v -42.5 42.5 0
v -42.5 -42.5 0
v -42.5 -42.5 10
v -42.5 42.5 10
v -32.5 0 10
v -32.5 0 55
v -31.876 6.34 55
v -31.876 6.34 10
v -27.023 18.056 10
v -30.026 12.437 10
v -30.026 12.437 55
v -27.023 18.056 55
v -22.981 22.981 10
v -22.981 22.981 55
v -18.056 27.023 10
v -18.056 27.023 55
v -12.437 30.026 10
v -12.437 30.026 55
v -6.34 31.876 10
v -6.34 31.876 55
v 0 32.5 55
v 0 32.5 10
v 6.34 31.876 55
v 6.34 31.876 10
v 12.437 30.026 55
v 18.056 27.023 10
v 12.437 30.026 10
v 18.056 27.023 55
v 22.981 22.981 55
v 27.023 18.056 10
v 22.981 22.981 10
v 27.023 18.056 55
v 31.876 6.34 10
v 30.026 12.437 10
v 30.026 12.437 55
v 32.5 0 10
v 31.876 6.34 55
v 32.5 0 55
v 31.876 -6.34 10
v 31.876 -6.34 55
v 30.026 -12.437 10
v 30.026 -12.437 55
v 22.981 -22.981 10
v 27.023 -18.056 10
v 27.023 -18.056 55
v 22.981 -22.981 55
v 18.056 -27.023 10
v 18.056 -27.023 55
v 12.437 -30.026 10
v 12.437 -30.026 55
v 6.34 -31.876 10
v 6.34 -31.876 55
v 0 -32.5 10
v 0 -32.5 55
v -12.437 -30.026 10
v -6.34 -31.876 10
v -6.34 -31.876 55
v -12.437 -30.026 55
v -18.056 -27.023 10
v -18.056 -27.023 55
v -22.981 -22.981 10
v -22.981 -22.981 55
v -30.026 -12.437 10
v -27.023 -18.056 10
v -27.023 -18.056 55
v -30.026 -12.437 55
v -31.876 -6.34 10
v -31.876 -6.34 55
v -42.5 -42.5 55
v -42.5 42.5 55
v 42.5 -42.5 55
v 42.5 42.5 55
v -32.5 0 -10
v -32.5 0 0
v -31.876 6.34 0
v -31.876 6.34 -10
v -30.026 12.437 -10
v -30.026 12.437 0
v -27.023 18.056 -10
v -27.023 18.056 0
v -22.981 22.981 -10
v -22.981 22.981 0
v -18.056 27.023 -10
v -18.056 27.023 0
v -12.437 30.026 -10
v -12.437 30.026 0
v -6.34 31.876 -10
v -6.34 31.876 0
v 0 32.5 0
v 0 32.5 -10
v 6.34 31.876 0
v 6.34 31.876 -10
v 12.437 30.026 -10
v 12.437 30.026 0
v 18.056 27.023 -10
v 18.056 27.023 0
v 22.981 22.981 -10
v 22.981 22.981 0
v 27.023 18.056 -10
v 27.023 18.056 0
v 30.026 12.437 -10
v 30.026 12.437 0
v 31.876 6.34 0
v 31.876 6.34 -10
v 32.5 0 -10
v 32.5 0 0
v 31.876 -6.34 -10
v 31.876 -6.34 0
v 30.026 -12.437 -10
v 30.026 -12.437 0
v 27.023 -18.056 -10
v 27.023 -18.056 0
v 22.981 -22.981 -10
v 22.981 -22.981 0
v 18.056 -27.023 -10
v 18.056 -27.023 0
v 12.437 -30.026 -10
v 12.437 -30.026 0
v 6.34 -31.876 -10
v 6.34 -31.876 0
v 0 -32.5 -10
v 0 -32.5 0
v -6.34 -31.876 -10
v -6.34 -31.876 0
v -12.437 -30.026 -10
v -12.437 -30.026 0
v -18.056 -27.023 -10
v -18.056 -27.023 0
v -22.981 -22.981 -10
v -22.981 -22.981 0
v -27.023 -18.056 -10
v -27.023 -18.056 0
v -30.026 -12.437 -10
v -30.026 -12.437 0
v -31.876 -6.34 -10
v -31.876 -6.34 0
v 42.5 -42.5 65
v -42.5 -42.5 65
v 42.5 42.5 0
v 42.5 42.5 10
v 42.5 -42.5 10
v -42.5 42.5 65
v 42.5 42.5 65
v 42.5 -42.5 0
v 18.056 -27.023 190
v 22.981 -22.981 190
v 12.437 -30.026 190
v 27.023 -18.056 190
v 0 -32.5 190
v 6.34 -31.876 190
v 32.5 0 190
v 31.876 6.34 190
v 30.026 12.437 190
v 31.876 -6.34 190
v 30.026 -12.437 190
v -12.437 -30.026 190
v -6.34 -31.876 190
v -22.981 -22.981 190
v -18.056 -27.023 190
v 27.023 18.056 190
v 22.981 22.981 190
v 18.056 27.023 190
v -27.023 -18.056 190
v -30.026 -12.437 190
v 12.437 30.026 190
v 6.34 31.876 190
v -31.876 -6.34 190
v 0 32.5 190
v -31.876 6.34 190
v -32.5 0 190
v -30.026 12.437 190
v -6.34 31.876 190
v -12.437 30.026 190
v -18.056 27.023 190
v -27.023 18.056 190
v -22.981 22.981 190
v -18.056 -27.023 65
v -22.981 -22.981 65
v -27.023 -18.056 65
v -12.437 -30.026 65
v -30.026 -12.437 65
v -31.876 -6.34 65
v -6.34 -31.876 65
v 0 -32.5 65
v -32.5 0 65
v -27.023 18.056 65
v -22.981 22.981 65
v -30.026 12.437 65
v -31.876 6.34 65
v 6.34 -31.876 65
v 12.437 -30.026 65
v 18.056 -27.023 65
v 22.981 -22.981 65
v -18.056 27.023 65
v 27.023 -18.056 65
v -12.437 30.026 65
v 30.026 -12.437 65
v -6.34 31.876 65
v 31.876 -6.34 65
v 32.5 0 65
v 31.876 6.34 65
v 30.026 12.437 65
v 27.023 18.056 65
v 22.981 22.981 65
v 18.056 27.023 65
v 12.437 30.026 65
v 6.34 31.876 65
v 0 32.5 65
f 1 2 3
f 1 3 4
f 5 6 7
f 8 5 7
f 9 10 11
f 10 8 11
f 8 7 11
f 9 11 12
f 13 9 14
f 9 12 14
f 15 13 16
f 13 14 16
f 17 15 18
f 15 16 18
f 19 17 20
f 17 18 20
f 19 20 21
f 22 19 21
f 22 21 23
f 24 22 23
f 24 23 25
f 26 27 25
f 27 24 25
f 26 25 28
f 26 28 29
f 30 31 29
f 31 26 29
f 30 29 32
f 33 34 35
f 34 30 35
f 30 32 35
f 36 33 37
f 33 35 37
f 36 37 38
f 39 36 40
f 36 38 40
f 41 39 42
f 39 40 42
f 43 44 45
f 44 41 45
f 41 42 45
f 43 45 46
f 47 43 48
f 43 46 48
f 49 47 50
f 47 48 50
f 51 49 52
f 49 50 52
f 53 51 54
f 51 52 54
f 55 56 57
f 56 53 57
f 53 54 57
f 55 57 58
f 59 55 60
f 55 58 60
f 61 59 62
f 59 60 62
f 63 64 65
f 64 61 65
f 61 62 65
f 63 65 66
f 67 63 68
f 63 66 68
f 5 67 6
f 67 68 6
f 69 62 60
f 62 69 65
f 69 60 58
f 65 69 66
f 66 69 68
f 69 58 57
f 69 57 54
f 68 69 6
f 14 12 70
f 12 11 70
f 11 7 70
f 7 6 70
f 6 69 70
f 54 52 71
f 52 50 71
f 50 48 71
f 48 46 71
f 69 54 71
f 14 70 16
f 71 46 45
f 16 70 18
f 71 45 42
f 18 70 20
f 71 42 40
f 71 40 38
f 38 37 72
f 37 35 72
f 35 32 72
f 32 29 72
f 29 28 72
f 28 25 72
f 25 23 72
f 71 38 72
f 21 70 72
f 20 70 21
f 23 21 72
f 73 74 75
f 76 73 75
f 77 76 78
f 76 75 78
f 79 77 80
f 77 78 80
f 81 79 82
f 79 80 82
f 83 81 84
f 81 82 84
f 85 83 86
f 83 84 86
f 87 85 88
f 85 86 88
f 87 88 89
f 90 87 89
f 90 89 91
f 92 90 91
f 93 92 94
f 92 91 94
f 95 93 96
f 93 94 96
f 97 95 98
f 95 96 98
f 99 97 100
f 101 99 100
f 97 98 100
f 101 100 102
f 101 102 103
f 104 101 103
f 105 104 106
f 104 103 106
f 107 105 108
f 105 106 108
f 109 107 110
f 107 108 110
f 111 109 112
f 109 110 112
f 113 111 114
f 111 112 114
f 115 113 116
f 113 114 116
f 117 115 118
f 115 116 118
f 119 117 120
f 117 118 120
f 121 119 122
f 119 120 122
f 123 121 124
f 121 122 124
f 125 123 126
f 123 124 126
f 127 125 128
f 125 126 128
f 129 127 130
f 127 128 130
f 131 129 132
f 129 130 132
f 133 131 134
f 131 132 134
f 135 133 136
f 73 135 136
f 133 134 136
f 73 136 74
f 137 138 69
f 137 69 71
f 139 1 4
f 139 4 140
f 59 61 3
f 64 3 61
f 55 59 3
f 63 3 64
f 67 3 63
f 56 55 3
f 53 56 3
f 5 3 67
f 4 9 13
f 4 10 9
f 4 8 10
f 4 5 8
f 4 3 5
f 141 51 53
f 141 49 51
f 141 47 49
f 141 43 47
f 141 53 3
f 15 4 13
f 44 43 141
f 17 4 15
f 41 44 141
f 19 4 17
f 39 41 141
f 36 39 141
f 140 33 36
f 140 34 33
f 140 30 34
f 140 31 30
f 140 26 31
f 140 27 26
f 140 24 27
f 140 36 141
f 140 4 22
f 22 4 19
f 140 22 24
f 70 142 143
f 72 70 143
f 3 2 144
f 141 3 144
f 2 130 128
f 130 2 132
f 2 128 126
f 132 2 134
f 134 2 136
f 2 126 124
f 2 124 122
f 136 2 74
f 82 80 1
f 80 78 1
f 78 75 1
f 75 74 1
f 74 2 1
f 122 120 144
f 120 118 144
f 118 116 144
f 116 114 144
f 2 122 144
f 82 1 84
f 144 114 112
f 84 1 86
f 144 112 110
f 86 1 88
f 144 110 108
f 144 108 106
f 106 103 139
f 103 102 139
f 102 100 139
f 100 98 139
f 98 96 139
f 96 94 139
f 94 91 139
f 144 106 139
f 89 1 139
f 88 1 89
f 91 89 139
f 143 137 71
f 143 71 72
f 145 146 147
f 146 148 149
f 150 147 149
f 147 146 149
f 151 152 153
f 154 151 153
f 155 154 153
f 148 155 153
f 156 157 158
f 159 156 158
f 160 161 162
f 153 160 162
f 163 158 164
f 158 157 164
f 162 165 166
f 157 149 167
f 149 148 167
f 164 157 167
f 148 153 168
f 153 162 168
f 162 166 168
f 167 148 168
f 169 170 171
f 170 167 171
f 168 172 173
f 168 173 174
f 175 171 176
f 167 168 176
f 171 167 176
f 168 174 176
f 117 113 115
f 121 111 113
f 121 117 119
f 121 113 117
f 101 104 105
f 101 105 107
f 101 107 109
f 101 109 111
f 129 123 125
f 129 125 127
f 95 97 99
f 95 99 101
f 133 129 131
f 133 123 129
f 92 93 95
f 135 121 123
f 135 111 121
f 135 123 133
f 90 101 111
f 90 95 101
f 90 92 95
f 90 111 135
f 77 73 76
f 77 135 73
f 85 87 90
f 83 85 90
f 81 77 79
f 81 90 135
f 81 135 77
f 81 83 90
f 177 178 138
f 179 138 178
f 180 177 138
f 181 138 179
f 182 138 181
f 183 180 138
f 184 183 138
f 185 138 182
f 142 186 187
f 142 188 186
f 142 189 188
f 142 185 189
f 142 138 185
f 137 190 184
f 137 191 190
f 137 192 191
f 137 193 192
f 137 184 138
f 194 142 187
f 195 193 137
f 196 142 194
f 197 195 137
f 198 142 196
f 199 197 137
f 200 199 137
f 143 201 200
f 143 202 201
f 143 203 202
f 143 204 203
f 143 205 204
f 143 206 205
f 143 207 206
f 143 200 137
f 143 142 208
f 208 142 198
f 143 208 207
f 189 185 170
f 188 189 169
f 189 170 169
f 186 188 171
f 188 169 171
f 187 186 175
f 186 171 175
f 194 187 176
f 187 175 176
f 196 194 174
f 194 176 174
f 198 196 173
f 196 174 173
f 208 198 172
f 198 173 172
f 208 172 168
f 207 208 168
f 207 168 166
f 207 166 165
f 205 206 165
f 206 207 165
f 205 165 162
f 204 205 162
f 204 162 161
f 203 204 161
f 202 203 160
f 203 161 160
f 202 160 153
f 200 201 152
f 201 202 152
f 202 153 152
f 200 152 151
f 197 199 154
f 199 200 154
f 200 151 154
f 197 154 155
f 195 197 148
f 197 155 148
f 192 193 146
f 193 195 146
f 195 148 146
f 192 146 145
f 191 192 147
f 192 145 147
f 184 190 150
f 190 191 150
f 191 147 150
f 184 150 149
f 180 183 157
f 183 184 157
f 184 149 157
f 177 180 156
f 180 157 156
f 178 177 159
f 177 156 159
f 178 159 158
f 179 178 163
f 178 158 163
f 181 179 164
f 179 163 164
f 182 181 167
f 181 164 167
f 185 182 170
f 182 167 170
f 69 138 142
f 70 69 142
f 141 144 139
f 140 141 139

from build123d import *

# Parameters (mm, degrees)
F0_W     = 32.5
F0_H     = 200
F2_W     = 85
F2_H     = 85
F3_DEPTH = 10
F5_W     = 85
F5_H     = 85
F6_DEPTH = 10


with BuildPart() as f1:
    # F0 (on Front) → F1 (revolve)
    with BuildSketch(Plane.XZ):
        with Locations((-16.25, 90)):
            Rectangle(F0_W, F0_H)
    revolve(axis=Axis((0, 0, 90), (0, 0, -1)))

    # F2 (on Top) → F3 (join)
    with BuildSketch(Plane.XY):
        Rectangle(F2_W, F2_H)
    extrude(amount=F3_DEPTH)

    # F5 (on offset) → F6 (join)
    with BuildSketch(Plane.XY.offset(65)):
        Rectangle(F5_W, F5_H)
    extrude(amount=-F6_DEPTH)


solid = f1.part
